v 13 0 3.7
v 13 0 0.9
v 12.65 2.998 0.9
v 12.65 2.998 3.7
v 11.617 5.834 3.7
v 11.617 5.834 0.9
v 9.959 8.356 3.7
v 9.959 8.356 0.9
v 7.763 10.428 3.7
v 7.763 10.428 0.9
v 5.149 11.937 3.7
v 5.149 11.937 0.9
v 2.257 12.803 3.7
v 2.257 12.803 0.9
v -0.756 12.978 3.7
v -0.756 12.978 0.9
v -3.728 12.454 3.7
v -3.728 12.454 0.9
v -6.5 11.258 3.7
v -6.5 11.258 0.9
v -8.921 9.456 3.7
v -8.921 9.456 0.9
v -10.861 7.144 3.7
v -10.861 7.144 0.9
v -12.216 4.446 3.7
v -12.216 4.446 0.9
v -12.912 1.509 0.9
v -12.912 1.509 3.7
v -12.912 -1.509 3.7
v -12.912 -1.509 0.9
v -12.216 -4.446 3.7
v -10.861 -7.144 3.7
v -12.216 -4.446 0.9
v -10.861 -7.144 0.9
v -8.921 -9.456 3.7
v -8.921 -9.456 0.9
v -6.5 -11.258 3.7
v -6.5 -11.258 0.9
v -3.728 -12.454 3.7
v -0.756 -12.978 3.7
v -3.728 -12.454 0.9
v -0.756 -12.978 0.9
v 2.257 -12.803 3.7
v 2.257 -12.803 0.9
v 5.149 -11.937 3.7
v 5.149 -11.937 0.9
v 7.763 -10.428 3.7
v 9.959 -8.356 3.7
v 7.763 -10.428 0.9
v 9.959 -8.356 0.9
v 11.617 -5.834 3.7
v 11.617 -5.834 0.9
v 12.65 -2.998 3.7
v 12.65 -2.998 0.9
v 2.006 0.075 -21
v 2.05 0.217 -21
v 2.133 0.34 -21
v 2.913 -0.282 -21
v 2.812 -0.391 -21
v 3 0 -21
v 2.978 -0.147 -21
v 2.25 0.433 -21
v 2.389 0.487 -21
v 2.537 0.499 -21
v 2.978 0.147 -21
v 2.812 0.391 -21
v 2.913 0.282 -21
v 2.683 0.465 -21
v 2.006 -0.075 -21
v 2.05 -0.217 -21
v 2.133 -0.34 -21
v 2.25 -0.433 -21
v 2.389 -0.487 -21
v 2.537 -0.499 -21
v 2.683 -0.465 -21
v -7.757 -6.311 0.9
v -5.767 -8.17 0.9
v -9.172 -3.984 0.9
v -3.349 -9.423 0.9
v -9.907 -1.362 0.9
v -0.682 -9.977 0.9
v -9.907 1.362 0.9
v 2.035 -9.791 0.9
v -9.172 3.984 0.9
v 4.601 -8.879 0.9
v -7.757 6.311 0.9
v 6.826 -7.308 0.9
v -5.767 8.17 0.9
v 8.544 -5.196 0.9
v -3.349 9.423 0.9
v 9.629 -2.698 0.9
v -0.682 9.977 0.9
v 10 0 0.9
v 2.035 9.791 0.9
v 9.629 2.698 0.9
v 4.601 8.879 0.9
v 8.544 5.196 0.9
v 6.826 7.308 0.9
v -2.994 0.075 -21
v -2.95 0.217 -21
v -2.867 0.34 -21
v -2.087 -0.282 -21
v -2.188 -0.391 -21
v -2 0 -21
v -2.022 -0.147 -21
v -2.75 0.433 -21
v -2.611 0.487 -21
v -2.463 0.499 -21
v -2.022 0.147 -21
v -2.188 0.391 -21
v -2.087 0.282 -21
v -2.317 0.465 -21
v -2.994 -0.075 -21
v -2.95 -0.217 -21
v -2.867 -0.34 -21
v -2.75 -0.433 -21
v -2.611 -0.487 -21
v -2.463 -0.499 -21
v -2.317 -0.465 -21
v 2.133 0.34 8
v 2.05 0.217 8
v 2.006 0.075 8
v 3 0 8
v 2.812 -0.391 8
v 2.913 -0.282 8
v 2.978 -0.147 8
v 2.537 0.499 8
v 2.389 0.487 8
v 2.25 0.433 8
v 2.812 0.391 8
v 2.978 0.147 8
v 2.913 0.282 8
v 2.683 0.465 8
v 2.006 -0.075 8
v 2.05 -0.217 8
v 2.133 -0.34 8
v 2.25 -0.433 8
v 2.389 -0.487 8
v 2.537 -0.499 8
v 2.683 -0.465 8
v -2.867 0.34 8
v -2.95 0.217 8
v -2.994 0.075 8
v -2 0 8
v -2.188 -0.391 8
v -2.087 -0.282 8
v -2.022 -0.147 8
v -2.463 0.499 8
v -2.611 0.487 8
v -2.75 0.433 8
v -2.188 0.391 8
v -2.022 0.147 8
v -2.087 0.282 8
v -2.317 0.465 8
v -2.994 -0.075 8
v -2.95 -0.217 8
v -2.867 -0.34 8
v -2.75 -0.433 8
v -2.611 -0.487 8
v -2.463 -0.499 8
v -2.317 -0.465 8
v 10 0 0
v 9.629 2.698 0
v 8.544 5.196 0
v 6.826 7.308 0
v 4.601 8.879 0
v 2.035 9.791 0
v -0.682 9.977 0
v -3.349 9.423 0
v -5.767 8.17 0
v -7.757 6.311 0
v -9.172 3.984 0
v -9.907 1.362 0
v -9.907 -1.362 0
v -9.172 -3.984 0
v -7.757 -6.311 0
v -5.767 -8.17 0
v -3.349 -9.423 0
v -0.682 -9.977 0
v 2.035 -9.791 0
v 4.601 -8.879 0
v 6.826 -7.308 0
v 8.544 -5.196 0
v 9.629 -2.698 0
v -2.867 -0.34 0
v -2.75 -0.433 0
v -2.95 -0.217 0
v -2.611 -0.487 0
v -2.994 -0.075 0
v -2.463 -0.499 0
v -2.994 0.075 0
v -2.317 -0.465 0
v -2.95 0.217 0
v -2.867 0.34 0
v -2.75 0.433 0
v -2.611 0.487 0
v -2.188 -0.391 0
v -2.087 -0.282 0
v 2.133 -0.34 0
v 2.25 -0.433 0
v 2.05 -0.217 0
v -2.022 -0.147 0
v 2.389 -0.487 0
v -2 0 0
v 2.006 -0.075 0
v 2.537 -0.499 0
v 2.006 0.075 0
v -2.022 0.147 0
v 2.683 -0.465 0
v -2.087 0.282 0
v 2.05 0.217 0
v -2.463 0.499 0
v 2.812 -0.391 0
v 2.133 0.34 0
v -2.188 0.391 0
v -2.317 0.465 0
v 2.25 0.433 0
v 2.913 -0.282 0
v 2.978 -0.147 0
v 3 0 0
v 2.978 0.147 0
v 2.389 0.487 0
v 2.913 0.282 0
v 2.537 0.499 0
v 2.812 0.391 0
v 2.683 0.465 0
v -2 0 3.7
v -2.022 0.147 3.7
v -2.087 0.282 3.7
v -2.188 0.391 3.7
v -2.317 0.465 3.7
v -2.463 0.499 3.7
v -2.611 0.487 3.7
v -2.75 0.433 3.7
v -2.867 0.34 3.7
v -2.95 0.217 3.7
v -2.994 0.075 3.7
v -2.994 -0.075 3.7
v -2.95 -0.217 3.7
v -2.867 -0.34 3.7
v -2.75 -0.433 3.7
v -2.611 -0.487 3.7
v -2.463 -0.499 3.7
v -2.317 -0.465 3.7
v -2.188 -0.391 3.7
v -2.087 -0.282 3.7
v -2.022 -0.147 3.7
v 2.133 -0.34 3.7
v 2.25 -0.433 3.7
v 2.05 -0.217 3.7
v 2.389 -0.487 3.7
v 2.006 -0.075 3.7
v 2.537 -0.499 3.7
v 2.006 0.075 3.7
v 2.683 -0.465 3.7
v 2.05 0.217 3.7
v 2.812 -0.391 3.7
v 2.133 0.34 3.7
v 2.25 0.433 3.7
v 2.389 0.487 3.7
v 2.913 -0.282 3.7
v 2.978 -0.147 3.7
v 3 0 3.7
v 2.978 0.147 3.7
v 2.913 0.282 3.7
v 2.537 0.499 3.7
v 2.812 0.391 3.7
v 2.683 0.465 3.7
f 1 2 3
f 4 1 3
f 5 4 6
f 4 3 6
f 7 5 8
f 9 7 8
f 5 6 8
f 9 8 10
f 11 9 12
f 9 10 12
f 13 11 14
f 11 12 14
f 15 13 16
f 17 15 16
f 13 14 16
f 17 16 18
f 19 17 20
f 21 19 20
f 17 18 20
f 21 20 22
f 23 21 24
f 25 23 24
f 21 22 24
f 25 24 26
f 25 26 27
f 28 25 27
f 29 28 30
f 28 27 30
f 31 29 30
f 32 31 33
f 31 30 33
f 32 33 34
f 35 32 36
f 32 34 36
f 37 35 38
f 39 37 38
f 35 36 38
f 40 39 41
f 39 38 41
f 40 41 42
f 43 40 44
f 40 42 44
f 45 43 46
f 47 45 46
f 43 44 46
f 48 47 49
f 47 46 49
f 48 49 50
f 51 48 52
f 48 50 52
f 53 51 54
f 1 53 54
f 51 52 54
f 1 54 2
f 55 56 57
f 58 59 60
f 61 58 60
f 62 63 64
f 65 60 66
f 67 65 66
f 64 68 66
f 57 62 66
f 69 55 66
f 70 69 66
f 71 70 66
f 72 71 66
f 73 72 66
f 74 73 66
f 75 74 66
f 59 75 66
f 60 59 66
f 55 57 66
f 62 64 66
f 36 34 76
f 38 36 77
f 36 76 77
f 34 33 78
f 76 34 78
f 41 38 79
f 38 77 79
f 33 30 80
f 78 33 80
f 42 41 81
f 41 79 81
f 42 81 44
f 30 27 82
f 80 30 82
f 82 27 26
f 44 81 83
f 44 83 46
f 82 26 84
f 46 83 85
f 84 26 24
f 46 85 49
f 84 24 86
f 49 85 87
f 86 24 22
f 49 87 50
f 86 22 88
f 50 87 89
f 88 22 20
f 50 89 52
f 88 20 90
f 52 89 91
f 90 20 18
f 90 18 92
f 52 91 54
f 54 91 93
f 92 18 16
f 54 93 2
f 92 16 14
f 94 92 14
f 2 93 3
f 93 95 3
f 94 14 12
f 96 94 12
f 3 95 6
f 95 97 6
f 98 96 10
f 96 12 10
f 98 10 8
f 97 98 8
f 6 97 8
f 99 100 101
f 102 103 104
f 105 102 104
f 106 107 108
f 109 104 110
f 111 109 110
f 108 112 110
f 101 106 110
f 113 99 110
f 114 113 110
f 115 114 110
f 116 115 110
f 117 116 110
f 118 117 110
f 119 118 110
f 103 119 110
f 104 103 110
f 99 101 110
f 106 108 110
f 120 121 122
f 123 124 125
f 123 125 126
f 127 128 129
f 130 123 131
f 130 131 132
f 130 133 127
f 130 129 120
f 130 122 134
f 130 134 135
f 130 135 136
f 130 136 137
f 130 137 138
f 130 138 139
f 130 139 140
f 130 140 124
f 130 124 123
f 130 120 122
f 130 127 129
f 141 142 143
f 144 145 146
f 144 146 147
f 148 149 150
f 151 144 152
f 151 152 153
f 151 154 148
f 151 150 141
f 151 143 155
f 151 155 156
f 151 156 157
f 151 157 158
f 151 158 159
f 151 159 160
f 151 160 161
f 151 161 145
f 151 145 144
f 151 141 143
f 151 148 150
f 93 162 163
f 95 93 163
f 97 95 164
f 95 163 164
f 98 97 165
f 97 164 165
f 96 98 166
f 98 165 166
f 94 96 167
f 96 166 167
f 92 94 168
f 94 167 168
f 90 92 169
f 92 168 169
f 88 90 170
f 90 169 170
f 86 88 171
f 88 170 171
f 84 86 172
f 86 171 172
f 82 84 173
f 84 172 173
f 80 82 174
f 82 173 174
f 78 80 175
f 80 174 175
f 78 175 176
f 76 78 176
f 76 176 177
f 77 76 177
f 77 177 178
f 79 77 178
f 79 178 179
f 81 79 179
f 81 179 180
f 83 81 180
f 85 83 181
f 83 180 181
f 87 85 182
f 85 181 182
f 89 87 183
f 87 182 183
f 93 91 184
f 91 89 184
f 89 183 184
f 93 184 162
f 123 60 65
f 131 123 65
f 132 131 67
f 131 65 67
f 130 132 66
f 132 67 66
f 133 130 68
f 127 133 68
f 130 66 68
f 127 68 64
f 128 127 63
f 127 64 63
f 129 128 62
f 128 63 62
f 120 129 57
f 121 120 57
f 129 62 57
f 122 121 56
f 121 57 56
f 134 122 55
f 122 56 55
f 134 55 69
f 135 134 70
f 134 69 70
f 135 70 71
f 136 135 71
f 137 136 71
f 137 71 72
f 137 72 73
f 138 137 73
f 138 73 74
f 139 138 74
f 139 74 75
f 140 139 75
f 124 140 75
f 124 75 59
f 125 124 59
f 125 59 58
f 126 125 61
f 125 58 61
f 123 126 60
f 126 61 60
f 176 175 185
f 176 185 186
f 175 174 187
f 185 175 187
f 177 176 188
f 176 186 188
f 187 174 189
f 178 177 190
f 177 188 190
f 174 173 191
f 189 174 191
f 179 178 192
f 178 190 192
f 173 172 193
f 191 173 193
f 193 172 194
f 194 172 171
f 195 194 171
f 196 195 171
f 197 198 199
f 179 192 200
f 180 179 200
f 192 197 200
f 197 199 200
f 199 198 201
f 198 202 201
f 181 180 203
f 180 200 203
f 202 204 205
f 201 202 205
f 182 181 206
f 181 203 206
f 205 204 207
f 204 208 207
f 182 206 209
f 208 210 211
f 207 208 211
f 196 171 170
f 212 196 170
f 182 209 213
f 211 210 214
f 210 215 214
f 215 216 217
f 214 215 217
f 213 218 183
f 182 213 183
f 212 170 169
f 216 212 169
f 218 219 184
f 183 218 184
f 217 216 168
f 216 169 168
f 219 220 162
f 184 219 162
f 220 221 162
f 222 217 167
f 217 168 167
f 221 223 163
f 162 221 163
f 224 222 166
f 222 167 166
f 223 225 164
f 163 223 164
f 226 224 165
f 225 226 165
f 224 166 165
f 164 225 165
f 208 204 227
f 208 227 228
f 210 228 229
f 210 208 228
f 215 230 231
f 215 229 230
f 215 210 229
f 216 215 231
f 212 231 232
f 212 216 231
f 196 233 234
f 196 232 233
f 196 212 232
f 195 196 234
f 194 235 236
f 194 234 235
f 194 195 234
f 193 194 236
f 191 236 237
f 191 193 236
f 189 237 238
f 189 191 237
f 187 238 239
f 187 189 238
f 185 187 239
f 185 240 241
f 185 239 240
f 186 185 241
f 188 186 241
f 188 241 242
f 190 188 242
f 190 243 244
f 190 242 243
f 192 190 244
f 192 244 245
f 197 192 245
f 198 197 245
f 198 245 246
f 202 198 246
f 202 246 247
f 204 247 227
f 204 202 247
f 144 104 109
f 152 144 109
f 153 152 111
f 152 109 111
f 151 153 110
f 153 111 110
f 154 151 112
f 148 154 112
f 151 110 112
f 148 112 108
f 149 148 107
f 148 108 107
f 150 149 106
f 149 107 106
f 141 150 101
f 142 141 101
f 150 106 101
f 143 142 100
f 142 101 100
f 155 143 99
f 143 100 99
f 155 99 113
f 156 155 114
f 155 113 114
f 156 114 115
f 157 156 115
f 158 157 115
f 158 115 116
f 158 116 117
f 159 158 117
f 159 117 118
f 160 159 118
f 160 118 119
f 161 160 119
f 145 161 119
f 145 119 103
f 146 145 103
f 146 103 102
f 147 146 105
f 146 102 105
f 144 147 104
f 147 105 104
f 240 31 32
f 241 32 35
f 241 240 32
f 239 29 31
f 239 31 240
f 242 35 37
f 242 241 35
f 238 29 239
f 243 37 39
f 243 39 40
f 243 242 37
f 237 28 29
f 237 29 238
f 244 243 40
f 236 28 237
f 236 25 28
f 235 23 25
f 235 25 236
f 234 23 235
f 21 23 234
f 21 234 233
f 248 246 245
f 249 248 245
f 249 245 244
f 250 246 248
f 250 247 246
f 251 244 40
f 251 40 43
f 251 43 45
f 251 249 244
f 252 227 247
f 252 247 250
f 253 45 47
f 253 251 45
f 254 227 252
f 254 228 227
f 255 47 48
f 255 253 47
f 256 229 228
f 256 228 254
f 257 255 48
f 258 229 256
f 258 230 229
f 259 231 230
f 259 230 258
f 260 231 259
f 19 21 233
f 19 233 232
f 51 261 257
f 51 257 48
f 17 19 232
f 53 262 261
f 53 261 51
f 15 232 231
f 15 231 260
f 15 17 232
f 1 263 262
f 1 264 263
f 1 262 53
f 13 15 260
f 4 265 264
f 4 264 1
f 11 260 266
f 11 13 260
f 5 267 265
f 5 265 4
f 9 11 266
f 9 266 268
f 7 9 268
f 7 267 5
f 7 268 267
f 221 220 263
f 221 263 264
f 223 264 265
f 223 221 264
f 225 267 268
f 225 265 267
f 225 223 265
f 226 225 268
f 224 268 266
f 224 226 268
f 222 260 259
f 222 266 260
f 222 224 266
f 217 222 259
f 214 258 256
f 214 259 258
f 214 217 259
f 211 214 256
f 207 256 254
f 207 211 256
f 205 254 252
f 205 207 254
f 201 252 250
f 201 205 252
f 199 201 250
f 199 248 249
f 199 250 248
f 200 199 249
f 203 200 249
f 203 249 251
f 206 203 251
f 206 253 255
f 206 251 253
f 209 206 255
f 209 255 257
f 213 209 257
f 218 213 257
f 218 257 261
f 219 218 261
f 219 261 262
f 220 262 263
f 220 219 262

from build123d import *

# Parameters (mm, degrees)
CYLINDER002_R     = 0.5
CYLINDER002_DEPTH = 29
CYLINDER003_R     = 0.5
CYLINDER003_DEPTH = 29
CYLINDER005_R     = 0.5
CYLINDER005_DEPTH = 29
CYLINDER004_R     = 0.5
CYLINDER004_DEPTH = 29
CYLINDER001_R     = 10
CYLINDER001_DEPTH = 3.7
CYLINDER_R        = 13
CYLINDER_DEPTH    = 2.8


with BuildPart() as cylinder002:
    # Cylinder002 → Cylinder002 (new body)
    with BuildSketch(Plane(origin=(2.5, 0, -21), x_dir=(1, 0, 0), z_dir=(0, 0, 1))):
        Circle(CYLINDER002_R)
    extrude(amount=CYLINDER002_DEPTH)


with BuildPart() as cylinder003:
    # Cylinder003 → Cylinder003 (new body)
    with BuildSketch(Plane(origin=(-2.5, 0, -21), x_dir=(1, 0, 0), z_dir=(0, 0, 1))):
        Circle(CYLINDER003_R)
    extrude(amount=CYLINDER003_DEPTH)


with BuildPart() as cylinder005:
    # Cylinder005 → Cylinder005 (new body)
    with BuildSketch(Plane(origin=(-2.5, 0, -21), x_dir=(1, 0, 0), z_dir=(0, 0, 1))):
        Circle(CYLINDER005_R)
    extrude(amount=CYLINDER005_DEPTH)


with BuildPart() as posts001:
    # Cylinder004 → Cylinder004 (new body)
    with BuildSketch(Plane(origin=(2.5, 0, -21), x_dir=(1, 0, 0), z_dir=(0, 0, 1))):
        Circle(CYLINDER004_R)
    extrude(amount=CYLINDER004_DEPTH)

    # Compound001: union Cylinder005
    add(cylinder005.part)


with BuildPart() as cylinder001:
    # Cylinder001 → Cylinder001 (new body)
    with BuildSketch(Plane.XY):
        Circle(CYLINDER001_R)
    extrude(amount=CYLINDER001_DEPTH)


with BuildPart() as ceramicsdisk:
    # Cylinder → Cylinder (new body)
    with BuildSketch(Plane.XY.offset(0.9)):
        Circle(CYLINDER_R)
    extrude(amount=CYLINDER_DEPTH)

    # Fusion: union Cylinder001
    add(cylinder001.part)

    # Cut: cut Posts001
    add(posts001.part, mode=Mode.SUBTRACT)


solid = Compound([cylinder002.part, cylinder003.part, ceramicsdisk.part])
